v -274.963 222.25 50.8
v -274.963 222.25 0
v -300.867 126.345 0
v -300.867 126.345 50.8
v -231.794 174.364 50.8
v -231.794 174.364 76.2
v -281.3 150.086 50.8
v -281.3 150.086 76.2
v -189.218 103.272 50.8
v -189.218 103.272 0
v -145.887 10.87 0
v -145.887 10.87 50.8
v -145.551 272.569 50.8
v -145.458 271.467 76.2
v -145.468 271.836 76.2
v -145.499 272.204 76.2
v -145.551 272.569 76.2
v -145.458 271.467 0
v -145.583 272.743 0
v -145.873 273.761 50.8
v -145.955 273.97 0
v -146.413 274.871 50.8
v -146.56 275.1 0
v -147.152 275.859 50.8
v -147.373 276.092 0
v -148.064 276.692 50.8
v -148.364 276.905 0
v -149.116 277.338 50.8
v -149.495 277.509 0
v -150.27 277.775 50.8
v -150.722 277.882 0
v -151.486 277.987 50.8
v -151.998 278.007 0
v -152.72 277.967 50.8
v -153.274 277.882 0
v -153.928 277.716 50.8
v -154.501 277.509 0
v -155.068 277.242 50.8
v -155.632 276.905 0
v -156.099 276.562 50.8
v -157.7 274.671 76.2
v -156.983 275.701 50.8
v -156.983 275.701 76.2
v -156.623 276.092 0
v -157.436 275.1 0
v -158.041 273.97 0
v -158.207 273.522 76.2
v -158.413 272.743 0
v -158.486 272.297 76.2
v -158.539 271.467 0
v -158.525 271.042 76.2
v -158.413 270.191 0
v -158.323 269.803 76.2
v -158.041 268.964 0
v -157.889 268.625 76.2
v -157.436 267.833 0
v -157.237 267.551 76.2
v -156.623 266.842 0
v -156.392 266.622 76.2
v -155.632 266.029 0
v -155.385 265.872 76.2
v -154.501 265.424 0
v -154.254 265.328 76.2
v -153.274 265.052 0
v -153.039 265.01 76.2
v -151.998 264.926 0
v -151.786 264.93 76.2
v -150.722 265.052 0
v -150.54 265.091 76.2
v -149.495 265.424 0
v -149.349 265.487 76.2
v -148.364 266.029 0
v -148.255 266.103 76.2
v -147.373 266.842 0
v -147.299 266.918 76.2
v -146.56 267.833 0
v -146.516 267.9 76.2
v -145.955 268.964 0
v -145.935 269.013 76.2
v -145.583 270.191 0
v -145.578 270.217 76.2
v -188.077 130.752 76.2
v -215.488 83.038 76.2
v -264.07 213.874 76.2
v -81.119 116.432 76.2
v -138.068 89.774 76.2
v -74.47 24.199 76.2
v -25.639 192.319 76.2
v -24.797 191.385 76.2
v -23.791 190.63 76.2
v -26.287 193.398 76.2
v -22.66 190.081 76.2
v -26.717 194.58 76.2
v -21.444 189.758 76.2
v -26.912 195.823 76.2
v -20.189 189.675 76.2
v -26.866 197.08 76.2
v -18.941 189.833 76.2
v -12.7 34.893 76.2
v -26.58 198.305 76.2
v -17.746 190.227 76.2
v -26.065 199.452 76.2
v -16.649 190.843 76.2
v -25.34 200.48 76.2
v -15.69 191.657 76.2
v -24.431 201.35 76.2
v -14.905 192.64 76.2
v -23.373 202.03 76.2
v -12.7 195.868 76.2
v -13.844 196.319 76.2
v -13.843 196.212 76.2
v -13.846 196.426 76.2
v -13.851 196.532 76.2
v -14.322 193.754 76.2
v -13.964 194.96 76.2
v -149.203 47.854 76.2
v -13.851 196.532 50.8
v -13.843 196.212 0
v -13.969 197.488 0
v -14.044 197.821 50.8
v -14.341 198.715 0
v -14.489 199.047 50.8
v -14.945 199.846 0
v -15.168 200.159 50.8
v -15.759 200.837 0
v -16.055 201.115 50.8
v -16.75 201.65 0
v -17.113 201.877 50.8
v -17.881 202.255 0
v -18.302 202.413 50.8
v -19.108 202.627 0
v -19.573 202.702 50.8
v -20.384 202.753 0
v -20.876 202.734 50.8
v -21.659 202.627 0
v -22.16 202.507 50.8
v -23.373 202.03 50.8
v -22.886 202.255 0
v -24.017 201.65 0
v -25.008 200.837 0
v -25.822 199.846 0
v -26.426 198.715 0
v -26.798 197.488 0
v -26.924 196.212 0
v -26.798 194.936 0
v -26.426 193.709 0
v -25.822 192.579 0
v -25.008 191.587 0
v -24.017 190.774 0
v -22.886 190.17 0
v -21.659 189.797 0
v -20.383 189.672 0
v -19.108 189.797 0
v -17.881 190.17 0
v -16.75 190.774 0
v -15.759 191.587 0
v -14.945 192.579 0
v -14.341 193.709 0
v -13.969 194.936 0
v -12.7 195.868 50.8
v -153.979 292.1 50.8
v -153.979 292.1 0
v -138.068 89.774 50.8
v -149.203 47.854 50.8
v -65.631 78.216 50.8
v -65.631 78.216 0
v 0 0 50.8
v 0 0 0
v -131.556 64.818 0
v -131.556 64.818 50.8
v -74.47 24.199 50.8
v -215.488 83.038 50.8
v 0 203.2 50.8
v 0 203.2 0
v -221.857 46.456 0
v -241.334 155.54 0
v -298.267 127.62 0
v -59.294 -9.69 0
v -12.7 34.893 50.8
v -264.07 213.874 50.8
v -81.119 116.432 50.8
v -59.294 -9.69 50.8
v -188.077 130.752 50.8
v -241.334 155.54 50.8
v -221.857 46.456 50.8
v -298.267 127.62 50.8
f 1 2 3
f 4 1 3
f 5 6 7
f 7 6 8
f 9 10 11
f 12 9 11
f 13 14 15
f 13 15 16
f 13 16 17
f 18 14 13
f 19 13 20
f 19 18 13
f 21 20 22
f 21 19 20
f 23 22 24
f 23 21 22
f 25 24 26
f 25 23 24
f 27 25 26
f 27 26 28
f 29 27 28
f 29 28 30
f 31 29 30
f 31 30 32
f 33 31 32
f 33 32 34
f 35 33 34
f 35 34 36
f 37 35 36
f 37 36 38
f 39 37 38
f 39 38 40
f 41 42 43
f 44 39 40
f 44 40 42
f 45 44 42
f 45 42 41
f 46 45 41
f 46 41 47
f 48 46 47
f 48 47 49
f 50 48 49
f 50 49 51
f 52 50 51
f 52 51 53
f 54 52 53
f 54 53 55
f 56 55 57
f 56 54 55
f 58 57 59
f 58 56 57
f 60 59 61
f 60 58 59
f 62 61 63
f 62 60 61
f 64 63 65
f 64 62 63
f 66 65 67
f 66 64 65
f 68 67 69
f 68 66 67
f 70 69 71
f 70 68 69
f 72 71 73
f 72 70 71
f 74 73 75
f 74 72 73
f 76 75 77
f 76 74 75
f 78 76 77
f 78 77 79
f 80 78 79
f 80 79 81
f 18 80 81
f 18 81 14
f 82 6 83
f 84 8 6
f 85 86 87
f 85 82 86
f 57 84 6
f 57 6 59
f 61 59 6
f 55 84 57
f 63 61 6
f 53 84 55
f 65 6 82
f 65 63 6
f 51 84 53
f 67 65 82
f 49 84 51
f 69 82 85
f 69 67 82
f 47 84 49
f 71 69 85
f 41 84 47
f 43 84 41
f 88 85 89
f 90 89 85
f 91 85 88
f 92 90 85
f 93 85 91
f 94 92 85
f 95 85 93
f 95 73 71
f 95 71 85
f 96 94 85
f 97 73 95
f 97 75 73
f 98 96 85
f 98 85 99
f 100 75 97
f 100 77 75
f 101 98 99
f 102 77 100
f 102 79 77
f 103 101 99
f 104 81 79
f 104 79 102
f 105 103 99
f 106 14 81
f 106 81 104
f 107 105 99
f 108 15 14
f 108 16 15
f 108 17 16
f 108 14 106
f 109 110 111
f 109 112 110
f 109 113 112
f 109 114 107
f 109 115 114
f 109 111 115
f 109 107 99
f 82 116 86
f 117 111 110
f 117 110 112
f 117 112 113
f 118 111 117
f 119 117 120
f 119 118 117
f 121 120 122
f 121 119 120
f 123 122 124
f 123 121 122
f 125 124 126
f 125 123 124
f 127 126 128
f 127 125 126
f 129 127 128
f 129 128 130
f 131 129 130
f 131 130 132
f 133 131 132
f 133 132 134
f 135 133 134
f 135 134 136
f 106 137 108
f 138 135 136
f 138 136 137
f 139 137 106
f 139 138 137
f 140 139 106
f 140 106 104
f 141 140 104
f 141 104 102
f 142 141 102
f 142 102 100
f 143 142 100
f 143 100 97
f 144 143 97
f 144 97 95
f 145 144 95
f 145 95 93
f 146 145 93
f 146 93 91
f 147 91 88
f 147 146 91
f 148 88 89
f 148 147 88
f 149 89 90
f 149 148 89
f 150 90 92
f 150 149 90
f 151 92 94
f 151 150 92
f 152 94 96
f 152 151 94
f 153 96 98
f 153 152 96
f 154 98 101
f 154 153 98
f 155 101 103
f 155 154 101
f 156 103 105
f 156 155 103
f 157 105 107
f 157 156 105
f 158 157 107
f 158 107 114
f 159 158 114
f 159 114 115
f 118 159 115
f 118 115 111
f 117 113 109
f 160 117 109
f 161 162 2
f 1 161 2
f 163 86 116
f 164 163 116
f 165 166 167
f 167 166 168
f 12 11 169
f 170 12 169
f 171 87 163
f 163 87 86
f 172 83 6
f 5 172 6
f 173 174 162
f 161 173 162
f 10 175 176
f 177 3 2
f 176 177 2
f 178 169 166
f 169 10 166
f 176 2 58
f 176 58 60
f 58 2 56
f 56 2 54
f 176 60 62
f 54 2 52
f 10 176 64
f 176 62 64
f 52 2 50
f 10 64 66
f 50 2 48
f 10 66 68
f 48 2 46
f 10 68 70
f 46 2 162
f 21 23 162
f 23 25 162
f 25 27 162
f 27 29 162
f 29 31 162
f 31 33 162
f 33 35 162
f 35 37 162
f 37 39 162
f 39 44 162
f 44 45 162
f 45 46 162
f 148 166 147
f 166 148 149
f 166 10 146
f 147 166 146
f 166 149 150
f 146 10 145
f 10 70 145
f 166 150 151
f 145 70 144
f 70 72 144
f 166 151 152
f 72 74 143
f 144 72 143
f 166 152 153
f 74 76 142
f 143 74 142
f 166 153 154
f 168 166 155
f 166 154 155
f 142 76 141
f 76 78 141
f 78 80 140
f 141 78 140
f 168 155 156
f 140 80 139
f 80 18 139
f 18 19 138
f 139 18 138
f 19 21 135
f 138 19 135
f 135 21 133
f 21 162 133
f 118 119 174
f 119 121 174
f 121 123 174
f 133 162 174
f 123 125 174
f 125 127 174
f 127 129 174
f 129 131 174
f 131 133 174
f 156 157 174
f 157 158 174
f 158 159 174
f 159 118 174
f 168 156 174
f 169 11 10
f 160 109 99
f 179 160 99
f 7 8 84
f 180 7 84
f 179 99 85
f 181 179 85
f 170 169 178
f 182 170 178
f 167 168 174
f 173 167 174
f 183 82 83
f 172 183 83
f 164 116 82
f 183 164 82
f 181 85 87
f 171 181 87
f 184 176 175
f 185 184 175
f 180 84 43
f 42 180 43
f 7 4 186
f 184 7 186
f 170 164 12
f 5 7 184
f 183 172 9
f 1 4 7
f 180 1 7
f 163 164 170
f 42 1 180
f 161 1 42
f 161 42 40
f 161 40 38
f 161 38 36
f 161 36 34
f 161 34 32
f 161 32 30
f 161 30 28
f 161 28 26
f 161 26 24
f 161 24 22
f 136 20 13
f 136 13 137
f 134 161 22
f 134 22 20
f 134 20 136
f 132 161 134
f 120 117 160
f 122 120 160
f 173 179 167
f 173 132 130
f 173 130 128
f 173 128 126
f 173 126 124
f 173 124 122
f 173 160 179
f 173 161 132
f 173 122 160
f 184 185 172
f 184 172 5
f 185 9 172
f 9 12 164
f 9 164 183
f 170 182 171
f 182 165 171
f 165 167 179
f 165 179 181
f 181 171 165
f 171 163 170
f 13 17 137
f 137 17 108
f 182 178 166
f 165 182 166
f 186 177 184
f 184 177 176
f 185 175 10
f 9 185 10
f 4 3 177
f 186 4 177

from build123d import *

# Parameters (mm, degrees)
F0_R     = 6.5405
F1_DEPTH = 76.2
F3_DEPTH = 25.4


with BuildPart() as f1:
    # F0 (on Top) → F1 (new body)
    with BuildSketch(Plane.XY):
        Polygon((-67.9690890407, 110.6476840292), (0, 76.2), (0, 203.2), (-153.9793167929, 292.1), (-274.9630657016, 222.25), (-275.7369360322, 215.9473319371), (-198.2431763687, 176.672411752), (-158.5945410949, 156.5779294016), (-113.2818150678, 133.6128067154), align=None)
        with Locations((-151.9981167929, 271.4667715498)):
            Circle(F0_R, mode=Mode.SUBTRACT)
        with Locations((-20.3835, 196.212271957)):
            Circle(F0_R, mode=Mode.SUBTRACT)
        Polygon((-198.2431763687, 176.672411752), (-275.7369360322, 215.9473319371), (-280.3801580159, 178.1313235595), (-298.267005539, 127.6204243564), (-241.3343504537, 155.5403700614), align=None)
        Polygon((-275.7369360322, 215.9473319371), (-274.9630657016, 222.25), (-300.8671202676, 126.3453202542), (-298.267005539, 127.6204243564), (-280.3801580159, 178.1313235595), align=None)
        Polygon((-189.2178803878, 103.2717895071), (-158.5945410949, 156.5779294016), (-198.2431763687, 176.672411752), (-241.3343504537, 155.5403700614), (-221.8573776706, 46.4561172643), align=None)
        Polygon((-131.5564353, 64.8183334656), (-113.2818150678, 133.6128067154), (-158.5945410949, 156.5779294016), (-189.2178803878, 103.2717895071), (-145.8874004982, 10.8696773813), align=None)
        Polygon((-59.2936250137, -9.6900026026), (-65.6310013179, 78.2159816061), (-67.9690890407, 110.6476840292), (-113.2818150678, 133.6128067154), (-131.5564353, 64.8183334656), align=None)
        Polygon((-65.6310013179, 78.2159816061), (0, 0), (0, 76.2), (-67.9690890407, 110.6476840292), align=None)
    extrude(amount=F1_DEPTH)

    # F2 (on face) → F3 (cut)
    with BuildSketch(Plane.XY.offset(76.2)):
        Polygon((0, 0), (0, 203.2), (-153.9793167929, 292.1), (-274.9630657016, 222.25), (-300.8671202676, 126.3453202542), (-241.3343504537, 155.5403700614), (-221.8573776706, 46.4561172643), (-189.2178803878, 103.2717895071), (-145.8874004982, 10.8696773813), (-131.5564353, 64.8183334656), (-59.2936250137, -9.6900026026), (-65.6310013179, 78.2159816061), align=None)
        with BuildLine():
            Line((-13.8508234279, 196.5320797972), (-12.7, 195.8676515813))
            Line((-12.7, 195.8676515813), (-12.7, 34.8929632271))
            Line((-12.7, 34.8929632271), (-81.1190261519, 116.4315834454))
            Line((-81.1190261519, 116.4315834454), (-74.4697648189, 24.1994303135))
            Line((-74.4697648189, 24.1994303135), (-138.067730519, 89.7736666719))
            Line((-138.067730519, 89.7736666719), (-149.2034024598, 47.8536335482))
            Line((-149.2034024598, 47.8536335482), (-188.0773837652, 130.7522764553))
            Line((-188.0773837652, 130.7522764553), (-215.4882373861, 83.0381201455))
            Line((-215.4882373861, 83.0381201455), (-231.7944080284, 174.363731179))
            Line((-231.7944080284, 174.363731179), (-281.2995293986, 150.0862704018))
            Line((-281.2995293986, 150.0862704018), (-264.0702576195, 213.874268841))
            Line((-264.0702576195, 213.874268841), (-156.9828667929, 275.7012027616))
            ThreePointArc((-156.9828667929, 275.7012027616), (-150.2699352174, 277.774824236), (-145.5512194367, 272.5693388853))
            Line((-145.5512194367, 272.5693388853), (-23.3728765721, 202.0296397432))
            ThreePointArc((-23.3728765721, 202.0296397432), (-17.11325, 201.8765111104), (-13.8508234279, 196.5320797972))
        make_face(mode=Mode.SUBTRACT)
    extrude(amount=-F3_DEPTH, mode=Mode.SUBTRACT)


solid = f1.part
